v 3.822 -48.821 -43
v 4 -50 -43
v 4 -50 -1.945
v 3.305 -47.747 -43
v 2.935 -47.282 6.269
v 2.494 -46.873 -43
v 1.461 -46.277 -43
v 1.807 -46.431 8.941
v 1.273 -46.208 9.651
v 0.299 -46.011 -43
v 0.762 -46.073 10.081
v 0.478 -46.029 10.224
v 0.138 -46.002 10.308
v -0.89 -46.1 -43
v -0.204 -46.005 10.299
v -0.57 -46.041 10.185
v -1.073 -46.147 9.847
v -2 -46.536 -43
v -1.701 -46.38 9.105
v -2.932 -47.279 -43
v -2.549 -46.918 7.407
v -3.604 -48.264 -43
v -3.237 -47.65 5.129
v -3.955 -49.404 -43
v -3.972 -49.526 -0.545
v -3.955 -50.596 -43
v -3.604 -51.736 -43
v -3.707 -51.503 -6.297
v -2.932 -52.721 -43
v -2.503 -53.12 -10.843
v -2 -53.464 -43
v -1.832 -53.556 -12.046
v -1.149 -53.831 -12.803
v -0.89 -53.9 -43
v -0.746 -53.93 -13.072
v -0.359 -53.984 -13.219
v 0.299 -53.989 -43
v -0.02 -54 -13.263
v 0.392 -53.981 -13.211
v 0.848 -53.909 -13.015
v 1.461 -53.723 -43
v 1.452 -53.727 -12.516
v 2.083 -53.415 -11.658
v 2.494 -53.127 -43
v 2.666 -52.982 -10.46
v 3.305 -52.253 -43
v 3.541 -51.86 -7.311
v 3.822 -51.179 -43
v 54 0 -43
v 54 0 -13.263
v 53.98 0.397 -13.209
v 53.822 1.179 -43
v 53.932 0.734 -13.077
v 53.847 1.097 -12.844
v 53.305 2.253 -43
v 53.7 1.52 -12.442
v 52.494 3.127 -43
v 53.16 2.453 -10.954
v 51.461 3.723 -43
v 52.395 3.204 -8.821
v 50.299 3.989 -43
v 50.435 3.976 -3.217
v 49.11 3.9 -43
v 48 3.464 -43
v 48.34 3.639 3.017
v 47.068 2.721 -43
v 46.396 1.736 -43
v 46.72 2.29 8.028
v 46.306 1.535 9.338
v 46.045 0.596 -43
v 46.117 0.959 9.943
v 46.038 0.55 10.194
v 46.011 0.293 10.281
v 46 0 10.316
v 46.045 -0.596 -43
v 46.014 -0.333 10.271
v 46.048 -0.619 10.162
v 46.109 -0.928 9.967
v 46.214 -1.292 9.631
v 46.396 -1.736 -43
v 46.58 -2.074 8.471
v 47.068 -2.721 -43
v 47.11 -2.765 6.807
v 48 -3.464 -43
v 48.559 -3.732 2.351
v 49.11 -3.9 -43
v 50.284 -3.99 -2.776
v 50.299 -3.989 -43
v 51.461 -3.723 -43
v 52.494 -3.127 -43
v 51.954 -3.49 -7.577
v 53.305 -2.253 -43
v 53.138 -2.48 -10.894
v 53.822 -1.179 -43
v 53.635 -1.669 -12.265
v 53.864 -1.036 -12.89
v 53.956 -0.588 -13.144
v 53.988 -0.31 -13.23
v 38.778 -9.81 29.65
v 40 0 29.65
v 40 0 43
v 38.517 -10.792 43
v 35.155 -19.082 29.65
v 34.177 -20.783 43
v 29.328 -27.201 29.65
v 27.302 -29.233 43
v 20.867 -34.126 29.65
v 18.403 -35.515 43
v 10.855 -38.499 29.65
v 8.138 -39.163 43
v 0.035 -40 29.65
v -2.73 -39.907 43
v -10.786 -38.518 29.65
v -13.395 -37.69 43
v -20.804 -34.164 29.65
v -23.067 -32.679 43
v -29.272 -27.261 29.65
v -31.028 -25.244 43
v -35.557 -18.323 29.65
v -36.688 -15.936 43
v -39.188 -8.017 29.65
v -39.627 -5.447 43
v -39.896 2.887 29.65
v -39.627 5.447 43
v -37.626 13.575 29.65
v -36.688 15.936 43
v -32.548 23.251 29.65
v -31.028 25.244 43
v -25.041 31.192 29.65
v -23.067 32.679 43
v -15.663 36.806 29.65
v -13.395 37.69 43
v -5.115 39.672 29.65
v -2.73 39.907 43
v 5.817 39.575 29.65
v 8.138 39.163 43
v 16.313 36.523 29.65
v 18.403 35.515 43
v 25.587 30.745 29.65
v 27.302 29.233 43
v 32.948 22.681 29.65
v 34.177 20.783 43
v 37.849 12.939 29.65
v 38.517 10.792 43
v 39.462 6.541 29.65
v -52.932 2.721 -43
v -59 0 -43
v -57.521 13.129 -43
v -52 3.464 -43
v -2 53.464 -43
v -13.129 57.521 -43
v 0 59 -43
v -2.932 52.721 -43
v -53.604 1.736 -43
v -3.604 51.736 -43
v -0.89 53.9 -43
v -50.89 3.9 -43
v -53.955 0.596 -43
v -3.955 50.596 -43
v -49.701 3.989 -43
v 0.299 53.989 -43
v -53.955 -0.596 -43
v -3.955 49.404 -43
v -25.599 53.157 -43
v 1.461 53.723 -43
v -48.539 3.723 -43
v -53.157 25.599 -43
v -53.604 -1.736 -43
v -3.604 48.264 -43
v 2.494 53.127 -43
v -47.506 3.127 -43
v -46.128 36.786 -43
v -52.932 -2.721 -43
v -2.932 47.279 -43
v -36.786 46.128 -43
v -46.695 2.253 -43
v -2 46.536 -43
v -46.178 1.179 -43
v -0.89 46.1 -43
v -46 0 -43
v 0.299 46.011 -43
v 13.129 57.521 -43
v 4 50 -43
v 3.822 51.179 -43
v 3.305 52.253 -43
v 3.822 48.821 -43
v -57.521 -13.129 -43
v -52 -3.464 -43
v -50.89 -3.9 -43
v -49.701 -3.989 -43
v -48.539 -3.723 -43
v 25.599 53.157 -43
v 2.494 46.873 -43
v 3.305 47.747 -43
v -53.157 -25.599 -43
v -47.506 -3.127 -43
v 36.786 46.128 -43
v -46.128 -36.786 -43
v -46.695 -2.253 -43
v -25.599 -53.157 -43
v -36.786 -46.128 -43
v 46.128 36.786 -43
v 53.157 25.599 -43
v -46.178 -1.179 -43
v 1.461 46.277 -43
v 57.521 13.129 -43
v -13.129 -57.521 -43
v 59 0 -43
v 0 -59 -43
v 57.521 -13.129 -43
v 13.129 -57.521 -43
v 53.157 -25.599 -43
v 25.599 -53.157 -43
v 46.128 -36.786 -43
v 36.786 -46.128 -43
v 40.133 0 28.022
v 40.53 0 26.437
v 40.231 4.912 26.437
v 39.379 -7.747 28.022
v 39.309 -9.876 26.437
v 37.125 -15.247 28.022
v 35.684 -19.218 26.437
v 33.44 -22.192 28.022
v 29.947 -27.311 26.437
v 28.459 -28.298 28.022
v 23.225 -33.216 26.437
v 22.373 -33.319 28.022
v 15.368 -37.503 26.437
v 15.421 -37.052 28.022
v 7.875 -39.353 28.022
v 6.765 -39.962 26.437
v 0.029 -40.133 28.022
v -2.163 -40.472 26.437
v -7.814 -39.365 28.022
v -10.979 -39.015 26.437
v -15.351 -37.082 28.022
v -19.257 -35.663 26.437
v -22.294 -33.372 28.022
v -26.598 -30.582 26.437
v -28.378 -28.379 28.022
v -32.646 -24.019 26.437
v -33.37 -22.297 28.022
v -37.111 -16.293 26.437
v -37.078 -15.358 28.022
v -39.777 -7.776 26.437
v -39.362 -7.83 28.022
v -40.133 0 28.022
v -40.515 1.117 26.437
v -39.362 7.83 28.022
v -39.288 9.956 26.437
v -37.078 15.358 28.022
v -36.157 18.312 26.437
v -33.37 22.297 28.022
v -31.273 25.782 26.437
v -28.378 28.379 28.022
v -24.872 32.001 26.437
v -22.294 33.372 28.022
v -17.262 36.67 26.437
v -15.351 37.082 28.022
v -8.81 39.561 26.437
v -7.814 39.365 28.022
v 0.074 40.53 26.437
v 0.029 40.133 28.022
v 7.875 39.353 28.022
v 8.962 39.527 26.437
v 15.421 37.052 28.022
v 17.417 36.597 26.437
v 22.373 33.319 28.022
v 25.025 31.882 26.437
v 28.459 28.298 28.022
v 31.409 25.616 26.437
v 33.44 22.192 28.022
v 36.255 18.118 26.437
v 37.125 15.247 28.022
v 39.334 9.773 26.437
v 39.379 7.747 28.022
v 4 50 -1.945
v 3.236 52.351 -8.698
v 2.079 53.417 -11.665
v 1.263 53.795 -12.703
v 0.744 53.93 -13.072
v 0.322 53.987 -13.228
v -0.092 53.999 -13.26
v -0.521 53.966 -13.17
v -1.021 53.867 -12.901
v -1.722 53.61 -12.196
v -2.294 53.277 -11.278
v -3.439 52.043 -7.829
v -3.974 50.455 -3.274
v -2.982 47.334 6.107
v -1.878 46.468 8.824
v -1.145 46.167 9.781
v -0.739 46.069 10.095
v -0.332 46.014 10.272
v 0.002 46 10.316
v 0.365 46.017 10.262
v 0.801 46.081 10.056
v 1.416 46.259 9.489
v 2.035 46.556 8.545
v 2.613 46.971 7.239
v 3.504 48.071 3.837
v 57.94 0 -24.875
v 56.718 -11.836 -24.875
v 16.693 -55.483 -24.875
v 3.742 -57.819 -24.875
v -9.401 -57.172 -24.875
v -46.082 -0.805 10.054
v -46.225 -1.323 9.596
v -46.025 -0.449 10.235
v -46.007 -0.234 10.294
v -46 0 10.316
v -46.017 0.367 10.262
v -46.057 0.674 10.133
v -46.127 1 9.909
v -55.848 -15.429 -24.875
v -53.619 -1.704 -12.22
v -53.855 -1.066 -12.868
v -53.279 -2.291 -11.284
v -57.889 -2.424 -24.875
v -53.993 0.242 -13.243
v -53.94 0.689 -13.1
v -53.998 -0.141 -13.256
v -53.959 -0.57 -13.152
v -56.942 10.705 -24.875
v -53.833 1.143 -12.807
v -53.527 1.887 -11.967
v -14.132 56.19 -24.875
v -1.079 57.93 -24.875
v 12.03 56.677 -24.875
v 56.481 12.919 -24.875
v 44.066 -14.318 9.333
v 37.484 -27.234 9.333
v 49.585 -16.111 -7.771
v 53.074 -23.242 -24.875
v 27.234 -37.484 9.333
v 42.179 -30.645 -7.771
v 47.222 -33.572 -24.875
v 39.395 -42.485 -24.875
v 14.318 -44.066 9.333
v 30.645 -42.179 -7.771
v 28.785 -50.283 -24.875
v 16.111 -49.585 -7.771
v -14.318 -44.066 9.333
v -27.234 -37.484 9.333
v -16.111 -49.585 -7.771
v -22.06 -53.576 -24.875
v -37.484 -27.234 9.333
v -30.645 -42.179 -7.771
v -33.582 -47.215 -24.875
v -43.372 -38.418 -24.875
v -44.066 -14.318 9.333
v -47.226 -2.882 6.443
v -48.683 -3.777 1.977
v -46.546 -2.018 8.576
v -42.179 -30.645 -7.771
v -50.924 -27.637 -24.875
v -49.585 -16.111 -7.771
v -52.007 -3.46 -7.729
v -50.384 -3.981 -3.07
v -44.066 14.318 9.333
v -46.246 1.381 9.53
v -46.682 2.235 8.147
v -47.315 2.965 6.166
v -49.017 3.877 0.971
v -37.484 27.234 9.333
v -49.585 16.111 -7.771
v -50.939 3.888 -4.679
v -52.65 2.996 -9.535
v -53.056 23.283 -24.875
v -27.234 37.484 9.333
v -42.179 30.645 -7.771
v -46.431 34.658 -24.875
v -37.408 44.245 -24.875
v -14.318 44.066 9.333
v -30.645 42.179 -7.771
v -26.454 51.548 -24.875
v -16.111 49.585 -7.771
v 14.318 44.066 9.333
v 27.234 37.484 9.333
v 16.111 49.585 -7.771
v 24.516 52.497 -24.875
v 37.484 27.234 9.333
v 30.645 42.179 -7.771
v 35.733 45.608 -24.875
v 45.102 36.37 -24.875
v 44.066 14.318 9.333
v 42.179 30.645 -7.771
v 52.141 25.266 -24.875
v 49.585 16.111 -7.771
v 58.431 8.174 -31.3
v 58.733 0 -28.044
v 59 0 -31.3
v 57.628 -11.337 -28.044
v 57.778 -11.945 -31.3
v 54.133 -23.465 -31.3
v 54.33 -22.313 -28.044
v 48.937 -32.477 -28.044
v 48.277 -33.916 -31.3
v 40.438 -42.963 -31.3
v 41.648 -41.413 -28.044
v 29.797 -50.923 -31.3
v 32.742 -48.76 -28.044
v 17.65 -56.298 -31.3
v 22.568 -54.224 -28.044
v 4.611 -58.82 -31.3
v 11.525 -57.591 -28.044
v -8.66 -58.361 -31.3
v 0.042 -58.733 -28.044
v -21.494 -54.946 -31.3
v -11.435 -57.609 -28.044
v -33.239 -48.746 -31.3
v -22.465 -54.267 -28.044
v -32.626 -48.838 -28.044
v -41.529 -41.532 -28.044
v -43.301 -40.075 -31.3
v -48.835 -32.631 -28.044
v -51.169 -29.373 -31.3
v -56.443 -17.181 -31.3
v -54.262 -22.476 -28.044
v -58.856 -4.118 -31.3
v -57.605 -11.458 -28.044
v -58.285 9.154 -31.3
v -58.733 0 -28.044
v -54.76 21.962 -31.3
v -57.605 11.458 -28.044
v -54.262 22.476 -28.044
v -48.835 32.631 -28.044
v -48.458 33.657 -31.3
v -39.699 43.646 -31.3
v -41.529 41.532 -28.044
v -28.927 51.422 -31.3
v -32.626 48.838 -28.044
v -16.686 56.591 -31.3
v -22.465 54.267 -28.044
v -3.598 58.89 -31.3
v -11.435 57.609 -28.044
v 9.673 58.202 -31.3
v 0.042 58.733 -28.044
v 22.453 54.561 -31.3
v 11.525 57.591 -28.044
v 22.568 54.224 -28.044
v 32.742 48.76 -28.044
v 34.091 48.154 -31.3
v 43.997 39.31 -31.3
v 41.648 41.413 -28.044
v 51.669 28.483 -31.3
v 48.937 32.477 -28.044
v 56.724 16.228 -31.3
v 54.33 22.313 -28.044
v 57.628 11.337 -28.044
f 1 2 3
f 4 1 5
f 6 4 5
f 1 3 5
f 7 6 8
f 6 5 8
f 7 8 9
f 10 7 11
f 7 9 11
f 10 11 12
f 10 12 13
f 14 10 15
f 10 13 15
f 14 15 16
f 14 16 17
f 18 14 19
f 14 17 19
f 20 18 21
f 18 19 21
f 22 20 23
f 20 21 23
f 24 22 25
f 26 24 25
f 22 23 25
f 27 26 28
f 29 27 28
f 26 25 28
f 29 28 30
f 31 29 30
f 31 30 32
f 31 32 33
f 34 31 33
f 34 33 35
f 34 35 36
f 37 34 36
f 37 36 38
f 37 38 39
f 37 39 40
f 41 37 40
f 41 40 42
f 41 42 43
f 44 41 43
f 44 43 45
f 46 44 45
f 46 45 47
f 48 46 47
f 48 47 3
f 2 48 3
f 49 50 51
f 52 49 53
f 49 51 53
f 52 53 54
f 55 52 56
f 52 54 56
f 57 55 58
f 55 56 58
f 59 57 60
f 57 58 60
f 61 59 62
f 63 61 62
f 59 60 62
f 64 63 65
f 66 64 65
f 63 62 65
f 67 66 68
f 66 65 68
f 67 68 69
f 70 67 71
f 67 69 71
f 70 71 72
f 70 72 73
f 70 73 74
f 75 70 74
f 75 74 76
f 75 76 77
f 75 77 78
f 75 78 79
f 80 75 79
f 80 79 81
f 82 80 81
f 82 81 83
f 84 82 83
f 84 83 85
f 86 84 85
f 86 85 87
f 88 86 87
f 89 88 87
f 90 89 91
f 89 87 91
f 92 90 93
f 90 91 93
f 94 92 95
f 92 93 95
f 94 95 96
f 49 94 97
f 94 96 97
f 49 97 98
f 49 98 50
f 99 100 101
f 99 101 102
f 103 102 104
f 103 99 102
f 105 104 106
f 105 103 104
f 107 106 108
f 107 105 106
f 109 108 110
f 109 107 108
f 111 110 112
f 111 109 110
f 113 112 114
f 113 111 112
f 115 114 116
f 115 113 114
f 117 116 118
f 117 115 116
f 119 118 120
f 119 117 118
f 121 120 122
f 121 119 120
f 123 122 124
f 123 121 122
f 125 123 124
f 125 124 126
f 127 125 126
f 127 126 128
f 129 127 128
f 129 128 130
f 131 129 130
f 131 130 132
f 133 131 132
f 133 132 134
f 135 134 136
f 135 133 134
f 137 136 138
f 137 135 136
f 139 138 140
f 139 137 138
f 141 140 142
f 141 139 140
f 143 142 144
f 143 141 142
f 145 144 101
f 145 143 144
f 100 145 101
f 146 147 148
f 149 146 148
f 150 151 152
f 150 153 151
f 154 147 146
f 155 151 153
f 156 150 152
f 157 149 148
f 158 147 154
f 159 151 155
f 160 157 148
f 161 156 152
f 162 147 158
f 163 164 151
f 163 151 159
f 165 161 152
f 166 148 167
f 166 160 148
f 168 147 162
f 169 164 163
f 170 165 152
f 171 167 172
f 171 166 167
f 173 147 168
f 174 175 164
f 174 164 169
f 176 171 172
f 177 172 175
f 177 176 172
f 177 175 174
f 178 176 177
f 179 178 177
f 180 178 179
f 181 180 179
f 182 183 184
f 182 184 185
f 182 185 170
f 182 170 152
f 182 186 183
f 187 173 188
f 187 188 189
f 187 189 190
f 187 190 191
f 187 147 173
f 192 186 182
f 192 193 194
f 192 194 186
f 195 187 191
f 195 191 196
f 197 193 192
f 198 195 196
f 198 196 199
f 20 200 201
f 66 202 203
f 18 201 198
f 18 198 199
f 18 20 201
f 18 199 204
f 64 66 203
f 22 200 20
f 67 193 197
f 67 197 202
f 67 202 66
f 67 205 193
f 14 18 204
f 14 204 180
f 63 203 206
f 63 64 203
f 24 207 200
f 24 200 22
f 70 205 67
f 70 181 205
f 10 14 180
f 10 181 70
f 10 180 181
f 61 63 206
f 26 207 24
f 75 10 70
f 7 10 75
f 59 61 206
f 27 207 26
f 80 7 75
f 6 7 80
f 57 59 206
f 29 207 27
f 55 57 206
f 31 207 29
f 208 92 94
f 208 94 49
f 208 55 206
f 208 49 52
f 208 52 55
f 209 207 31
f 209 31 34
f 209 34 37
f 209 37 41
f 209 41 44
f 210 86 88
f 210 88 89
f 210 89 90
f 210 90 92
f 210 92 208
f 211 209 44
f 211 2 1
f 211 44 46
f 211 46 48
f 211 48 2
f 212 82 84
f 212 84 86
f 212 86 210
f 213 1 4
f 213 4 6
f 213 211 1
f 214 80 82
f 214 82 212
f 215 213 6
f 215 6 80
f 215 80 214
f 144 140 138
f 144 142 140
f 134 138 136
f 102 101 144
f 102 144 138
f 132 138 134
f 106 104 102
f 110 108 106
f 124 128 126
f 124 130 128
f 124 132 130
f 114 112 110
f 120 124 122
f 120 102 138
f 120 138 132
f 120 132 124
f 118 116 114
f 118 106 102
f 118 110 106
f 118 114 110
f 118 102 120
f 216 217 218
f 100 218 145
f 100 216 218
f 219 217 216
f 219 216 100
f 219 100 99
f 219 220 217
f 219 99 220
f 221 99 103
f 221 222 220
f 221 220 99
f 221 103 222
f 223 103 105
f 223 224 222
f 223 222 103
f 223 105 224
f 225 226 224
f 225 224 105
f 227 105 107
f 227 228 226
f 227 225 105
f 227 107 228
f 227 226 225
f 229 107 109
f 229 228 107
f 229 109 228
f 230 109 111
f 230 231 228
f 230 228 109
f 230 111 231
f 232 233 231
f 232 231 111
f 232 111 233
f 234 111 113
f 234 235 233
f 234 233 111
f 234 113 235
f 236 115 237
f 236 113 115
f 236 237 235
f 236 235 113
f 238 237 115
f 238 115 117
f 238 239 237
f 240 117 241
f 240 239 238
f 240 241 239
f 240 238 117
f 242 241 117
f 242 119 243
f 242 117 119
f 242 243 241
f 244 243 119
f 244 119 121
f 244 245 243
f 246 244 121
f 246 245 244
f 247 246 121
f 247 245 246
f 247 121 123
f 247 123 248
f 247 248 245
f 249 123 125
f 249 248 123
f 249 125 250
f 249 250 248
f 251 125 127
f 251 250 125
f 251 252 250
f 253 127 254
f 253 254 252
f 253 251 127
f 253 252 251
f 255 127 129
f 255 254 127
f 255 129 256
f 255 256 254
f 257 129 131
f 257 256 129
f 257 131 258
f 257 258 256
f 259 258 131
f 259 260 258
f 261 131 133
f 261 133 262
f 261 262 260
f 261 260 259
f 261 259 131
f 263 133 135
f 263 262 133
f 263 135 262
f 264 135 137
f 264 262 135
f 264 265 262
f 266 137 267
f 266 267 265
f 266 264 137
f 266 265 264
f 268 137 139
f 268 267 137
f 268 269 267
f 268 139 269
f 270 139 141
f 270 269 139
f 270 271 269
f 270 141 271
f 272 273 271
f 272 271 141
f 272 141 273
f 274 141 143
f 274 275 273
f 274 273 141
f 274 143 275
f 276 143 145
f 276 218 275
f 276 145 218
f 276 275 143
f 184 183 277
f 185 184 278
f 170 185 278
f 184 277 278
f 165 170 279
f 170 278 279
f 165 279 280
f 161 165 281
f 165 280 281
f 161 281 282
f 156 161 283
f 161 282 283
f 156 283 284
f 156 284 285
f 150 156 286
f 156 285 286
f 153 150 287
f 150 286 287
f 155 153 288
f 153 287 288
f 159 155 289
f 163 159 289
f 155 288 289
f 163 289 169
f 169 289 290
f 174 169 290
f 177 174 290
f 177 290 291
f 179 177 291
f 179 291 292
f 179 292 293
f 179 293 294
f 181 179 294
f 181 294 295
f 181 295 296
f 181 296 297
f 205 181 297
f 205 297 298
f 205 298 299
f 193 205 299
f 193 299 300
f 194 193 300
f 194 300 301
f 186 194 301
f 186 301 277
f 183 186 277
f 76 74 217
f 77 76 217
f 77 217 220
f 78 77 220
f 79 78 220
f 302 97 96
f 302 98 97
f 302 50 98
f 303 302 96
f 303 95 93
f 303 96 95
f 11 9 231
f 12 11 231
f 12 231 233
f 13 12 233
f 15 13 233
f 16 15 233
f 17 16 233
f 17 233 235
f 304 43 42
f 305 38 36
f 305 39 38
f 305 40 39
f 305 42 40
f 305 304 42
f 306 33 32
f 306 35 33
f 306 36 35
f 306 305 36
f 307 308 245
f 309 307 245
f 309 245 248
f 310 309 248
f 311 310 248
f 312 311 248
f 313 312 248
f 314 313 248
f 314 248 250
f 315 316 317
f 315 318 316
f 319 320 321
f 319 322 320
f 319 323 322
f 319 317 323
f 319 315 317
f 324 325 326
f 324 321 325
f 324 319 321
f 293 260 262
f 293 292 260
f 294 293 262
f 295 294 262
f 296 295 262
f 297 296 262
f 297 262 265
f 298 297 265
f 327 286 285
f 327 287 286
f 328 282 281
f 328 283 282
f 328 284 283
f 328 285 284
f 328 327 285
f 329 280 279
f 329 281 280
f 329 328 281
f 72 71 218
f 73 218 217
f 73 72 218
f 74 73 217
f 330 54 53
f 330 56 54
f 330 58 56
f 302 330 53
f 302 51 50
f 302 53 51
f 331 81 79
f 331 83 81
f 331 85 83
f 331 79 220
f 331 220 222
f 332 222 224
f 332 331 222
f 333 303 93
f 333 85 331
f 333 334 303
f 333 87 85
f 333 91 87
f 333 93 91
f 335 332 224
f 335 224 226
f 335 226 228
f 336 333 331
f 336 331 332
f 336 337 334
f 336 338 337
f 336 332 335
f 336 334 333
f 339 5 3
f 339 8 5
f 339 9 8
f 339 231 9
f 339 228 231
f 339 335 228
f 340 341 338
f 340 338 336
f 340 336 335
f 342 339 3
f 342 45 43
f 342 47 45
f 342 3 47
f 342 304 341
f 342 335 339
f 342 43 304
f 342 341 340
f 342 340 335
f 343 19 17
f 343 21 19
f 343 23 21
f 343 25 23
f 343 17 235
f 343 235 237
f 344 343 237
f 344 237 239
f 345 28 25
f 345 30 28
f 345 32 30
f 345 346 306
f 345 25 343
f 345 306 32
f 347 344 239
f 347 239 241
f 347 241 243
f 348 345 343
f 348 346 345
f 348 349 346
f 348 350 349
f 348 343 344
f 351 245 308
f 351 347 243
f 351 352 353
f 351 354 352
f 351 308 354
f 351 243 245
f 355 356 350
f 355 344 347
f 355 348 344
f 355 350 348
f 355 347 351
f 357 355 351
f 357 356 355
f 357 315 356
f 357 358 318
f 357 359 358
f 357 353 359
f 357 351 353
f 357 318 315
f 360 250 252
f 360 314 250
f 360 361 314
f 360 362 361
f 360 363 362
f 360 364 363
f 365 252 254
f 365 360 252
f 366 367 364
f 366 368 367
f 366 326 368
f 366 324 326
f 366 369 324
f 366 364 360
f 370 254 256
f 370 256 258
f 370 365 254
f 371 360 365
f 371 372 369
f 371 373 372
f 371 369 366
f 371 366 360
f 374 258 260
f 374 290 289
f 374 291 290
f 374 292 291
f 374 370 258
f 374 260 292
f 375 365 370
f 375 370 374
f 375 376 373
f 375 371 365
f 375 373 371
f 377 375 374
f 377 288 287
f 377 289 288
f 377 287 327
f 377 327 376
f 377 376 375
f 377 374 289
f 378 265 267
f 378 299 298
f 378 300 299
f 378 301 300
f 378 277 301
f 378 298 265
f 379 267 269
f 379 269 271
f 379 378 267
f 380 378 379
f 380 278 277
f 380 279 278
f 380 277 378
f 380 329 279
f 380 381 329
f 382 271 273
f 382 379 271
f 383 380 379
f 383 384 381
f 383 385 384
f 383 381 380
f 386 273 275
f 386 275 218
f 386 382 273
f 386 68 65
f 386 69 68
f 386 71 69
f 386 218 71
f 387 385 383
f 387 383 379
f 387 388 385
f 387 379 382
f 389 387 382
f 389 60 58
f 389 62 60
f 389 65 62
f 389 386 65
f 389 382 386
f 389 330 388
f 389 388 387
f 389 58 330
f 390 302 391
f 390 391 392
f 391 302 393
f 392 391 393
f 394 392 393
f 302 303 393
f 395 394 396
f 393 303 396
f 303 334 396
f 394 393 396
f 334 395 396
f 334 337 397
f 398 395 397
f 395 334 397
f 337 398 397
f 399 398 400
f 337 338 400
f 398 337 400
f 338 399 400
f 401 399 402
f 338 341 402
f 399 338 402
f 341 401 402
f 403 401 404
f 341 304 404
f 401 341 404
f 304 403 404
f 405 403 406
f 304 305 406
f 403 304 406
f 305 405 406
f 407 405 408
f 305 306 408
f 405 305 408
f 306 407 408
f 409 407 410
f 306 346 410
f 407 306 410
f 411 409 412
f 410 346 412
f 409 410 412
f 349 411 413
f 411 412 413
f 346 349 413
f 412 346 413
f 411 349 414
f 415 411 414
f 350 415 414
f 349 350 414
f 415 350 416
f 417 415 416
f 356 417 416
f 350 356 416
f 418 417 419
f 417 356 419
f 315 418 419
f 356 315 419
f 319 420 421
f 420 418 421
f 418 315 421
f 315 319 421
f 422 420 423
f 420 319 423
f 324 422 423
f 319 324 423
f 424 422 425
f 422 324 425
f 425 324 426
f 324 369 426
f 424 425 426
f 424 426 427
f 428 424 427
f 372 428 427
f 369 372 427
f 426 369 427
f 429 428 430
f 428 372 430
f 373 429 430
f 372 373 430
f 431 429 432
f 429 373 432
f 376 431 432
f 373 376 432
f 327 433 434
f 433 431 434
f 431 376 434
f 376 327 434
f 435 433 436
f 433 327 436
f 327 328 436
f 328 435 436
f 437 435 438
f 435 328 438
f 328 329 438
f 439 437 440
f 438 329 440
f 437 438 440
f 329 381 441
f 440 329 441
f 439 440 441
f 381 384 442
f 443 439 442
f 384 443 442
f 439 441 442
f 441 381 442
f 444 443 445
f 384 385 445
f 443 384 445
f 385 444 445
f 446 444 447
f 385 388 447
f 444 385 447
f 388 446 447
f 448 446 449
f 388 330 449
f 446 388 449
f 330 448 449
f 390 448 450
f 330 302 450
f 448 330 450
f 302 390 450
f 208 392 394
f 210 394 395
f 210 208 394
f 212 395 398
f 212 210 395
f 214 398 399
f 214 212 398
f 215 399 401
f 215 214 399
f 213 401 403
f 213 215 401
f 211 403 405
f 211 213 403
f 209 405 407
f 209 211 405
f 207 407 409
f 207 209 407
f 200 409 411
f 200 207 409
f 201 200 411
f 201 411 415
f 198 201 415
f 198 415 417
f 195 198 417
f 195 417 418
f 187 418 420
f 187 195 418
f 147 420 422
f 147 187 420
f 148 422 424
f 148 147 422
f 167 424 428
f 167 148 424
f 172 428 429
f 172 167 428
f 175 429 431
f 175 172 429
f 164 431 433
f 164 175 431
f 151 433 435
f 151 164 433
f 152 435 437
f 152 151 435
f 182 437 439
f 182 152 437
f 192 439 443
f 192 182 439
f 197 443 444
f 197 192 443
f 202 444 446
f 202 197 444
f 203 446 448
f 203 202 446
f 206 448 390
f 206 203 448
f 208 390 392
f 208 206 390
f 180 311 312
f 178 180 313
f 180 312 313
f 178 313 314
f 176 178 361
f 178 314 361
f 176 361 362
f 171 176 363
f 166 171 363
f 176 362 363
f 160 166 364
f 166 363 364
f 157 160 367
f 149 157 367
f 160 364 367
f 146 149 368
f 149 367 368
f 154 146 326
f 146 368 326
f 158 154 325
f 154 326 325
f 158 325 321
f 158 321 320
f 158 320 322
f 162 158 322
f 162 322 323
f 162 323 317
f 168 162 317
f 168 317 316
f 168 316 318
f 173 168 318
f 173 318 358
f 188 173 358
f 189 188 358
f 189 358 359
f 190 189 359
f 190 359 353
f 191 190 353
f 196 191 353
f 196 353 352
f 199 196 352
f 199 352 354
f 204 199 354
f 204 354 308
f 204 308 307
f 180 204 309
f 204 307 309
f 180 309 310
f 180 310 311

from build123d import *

# Parameters (mm, degrees)
FILLET1_R          = 20
FILLET2_R          = 10
SKETCH2_R          = 4
CUT_EXTRUDE1_DEPTH = 120.824873174


with BuildPart() as part:
    # Sketch1 → Revolve1 (revolve)
    with BuildSketch(Plane(origin=(0, 0, 0), x_dir=(1, 0, 0), z_dir=(0, 1, 0)), mode=Mode.PRIVATE) as revolve1_sk:
        Polygon((0, -43), (-40, -43), (-40, -28), (-59, 28), (-59, 43), (0, 43), align=None)
    revolve(revolve1_sk.sketch.rotate(Axis((0, 0, 171.126428829), (0, 0, -1)), 180), axis=Axis((0, 0, 171.126428829), (0, 0, -1)))

    # Fillet1
    fillet1_edges = [part.edges().sort_by_distance(p)[0] for p in [
        (-59, 0, -28),
    ]]
    fillet(fillet1_edges, radius=FILLET1_R)

    # Fillet2
    fillet2_edges = [part.edges().sort_by_distance(p)[0] for p in [
        (-40, 0, 28),
    ]]
    fillet(fillet2_edges, radius=FILLET2_R)

    # Sketch2 → Cut-Extrude1 (cut, through all)
    with BuildSketch(Plane.XY.offset(43)):
        with Locations((0, 50)):
            Circle(SKETCH2_R)
        with Locations((50, 0)):
            Circle(SKETCH2_R)
        with Locations((0, -50)):
            Circle(SKETCH2_R)
        with Locations((-50, 0)):
            Circle(SKETCH2_R)
    extrude(amount=-CUT_EXTRUDE1_DEPTH, mode=Mode.SUBTRACT)


solid = part.part
